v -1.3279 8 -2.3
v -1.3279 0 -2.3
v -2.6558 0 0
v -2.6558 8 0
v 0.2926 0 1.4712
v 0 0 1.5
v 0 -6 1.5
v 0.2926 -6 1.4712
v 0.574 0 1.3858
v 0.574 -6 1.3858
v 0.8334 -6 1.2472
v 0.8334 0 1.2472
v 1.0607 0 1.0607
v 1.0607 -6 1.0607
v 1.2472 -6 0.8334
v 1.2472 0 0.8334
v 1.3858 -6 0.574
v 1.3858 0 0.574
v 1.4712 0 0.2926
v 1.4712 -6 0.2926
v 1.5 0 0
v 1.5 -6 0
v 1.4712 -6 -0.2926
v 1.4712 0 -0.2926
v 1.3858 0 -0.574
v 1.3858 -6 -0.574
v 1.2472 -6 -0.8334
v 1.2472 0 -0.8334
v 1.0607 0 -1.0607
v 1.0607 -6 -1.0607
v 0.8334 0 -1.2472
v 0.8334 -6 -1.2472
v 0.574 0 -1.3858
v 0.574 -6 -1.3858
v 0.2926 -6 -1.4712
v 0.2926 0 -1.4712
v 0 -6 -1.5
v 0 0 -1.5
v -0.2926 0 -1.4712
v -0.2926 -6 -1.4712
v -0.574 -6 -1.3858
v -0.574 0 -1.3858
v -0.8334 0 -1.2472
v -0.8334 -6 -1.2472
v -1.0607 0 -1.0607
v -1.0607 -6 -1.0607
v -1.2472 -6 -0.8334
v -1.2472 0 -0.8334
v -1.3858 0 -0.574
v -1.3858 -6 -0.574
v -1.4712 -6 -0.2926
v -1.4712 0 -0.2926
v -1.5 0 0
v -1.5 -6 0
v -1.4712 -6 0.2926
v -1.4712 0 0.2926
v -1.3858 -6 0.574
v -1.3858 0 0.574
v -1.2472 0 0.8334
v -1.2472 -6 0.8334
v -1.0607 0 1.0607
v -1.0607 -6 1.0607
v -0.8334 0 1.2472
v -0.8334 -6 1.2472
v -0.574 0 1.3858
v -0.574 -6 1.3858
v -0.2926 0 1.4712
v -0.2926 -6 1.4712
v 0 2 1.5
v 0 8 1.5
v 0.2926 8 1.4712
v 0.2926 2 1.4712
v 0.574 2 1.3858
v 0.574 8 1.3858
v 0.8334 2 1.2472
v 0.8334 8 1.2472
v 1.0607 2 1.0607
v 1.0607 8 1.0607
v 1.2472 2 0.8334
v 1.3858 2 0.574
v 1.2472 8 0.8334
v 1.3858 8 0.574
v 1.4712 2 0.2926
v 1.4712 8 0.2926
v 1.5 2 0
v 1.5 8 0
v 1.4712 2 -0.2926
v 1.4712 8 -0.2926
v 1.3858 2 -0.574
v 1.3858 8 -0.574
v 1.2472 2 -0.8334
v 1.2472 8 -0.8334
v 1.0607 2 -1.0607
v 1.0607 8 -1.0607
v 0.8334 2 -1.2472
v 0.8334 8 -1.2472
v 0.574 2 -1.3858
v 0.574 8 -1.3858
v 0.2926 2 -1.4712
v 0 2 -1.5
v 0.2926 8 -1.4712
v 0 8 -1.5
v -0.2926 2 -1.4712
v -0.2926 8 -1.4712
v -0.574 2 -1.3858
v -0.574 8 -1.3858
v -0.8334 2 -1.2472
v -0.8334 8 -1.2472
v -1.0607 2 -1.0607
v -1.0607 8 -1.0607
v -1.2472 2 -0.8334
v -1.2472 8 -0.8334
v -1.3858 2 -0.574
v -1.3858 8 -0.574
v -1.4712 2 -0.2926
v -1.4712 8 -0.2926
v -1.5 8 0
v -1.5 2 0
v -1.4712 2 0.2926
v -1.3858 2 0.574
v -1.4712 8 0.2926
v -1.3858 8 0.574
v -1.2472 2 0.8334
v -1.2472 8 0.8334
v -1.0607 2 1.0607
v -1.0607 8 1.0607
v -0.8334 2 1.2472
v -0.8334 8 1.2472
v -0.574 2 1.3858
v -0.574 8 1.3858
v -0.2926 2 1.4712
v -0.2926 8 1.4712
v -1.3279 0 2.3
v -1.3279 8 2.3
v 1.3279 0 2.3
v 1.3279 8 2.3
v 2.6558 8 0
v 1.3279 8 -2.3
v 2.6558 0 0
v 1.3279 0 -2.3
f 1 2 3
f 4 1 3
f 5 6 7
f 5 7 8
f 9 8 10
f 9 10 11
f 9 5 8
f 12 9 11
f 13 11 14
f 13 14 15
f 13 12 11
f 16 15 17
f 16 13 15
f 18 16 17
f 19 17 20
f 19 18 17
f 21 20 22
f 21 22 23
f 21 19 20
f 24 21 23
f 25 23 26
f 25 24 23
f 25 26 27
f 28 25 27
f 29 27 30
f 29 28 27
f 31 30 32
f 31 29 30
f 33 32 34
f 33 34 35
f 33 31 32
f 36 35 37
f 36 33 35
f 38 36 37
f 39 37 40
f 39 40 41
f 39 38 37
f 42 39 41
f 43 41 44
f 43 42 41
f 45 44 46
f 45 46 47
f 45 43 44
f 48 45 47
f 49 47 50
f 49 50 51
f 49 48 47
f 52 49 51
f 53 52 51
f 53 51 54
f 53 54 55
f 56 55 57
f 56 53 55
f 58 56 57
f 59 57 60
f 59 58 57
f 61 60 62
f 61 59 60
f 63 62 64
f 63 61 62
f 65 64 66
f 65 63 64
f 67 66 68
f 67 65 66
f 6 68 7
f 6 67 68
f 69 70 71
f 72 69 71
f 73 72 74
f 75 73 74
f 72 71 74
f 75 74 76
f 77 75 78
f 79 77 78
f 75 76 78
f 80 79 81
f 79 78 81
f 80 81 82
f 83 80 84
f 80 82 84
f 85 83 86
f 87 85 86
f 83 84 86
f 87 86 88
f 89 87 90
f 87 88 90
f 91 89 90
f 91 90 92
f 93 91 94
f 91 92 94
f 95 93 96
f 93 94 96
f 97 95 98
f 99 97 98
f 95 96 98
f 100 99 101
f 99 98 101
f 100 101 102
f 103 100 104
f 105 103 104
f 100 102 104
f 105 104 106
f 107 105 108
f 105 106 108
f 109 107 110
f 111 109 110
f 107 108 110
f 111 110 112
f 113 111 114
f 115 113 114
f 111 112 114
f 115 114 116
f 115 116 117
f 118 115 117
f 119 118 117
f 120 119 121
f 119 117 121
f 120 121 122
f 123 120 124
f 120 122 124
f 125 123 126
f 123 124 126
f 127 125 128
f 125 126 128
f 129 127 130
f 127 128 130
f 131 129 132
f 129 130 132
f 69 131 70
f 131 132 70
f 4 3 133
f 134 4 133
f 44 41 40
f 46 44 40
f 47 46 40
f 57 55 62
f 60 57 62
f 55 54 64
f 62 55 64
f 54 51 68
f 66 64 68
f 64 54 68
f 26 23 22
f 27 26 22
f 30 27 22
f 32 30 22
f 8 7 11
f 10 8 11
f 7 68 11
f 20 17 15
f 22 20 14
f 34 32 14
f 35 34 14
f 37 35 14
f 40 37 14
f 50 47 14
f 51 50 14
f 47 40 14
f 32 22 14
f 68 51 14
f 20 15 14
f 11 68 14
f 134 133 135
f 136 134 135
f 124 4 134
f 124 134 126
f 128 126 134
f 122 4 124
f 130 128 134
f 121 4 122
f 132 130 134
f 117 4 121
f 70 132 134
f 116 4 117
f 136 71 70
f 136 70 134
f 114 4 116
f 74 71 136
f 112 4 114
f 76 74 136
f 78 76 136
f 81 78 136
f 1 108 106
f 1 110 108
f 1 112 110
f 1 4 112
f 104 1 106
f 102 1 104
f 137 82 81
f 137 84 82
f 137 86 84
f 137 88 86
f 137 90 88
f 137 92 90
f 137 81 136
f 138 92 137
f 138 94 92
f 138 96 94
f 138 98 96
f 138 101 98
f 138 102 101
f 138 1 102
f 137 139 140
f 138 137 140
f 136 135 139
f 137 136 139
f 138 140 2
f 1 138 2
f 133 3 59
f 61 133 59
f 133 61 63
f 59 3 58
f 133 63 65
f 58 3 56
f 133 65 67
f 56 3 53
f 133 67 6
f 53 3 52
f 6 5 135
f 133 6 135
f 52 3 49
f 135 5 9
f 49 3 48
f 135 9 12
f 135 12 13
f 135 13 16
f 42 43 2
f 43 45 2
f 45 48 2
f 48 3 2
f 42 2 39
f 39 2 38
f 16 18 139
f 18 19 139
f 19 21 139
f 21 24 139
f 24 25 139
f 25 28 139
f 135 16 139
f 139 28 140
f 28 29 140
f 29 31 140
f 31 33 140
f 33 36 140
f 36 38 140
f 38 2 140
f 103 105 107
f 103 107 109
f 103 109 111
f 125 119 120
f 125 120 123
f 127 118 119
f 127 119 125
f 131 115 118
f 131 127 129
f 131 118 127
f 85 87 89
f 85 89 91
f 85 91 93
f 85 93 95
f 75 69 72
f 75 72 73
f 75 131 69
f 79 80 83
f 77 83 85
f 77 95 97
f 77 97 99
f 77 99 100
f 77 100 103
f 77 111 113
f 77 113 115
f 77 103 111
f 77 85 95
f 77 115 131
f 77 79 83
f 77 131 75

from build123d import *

# Parameters (mm, degrees)
HEX_PART_DEPTH   = 8
SKETCH2_R        = 1.5
THREAD_DEPTH     = 6
SKETCH3_R        = 1.5
HEX_THREAD_DEPTH = 6


with BuildPart() as part:
    # Sketch1 → HEX PART (new body)
    with BuildSketch(Plane(origin=(0, 0, 0), x_dir=(1, 0, 0), z_dir=(0, 1, 0))):
        Polygon((2.655811238, 0), (1.327905619, 2.3), (-1.327905619, 2.3), (-2.655811238, 0), (-1.327905619, -2.3), (1.327905619, -2.3), align=None)
    extrude(amount=HEX_PART_DEPTH)

    # Sketch2 → THREAD (add)
    with BuildSketch(Plane(origin=(0, 0, 0), x_dir=(1, 0, 0), z_dir=(0, 1, 0))):
        with Locations(Location((0, 0, 0), (0, 0, 270))):
            Circle(SKETCH2_R)
    extrude(amount=-THREAD_DEPTH)

    # Sketch3 → HEX THREAD (cut)
    with BuildSketch(Plane(origin=(0, 8, 0), x_dir=(1, 0, 0), z_dir=(0, 1, 0))):
        with Locations(Location((0, 0, 0), (0, 0, 270))):
            Circle(SKETCH3_R)
    extrude(amount=-HEX_THREAD_DEPTH, mode=Mode.SUBTRACT)


solid = part.part
